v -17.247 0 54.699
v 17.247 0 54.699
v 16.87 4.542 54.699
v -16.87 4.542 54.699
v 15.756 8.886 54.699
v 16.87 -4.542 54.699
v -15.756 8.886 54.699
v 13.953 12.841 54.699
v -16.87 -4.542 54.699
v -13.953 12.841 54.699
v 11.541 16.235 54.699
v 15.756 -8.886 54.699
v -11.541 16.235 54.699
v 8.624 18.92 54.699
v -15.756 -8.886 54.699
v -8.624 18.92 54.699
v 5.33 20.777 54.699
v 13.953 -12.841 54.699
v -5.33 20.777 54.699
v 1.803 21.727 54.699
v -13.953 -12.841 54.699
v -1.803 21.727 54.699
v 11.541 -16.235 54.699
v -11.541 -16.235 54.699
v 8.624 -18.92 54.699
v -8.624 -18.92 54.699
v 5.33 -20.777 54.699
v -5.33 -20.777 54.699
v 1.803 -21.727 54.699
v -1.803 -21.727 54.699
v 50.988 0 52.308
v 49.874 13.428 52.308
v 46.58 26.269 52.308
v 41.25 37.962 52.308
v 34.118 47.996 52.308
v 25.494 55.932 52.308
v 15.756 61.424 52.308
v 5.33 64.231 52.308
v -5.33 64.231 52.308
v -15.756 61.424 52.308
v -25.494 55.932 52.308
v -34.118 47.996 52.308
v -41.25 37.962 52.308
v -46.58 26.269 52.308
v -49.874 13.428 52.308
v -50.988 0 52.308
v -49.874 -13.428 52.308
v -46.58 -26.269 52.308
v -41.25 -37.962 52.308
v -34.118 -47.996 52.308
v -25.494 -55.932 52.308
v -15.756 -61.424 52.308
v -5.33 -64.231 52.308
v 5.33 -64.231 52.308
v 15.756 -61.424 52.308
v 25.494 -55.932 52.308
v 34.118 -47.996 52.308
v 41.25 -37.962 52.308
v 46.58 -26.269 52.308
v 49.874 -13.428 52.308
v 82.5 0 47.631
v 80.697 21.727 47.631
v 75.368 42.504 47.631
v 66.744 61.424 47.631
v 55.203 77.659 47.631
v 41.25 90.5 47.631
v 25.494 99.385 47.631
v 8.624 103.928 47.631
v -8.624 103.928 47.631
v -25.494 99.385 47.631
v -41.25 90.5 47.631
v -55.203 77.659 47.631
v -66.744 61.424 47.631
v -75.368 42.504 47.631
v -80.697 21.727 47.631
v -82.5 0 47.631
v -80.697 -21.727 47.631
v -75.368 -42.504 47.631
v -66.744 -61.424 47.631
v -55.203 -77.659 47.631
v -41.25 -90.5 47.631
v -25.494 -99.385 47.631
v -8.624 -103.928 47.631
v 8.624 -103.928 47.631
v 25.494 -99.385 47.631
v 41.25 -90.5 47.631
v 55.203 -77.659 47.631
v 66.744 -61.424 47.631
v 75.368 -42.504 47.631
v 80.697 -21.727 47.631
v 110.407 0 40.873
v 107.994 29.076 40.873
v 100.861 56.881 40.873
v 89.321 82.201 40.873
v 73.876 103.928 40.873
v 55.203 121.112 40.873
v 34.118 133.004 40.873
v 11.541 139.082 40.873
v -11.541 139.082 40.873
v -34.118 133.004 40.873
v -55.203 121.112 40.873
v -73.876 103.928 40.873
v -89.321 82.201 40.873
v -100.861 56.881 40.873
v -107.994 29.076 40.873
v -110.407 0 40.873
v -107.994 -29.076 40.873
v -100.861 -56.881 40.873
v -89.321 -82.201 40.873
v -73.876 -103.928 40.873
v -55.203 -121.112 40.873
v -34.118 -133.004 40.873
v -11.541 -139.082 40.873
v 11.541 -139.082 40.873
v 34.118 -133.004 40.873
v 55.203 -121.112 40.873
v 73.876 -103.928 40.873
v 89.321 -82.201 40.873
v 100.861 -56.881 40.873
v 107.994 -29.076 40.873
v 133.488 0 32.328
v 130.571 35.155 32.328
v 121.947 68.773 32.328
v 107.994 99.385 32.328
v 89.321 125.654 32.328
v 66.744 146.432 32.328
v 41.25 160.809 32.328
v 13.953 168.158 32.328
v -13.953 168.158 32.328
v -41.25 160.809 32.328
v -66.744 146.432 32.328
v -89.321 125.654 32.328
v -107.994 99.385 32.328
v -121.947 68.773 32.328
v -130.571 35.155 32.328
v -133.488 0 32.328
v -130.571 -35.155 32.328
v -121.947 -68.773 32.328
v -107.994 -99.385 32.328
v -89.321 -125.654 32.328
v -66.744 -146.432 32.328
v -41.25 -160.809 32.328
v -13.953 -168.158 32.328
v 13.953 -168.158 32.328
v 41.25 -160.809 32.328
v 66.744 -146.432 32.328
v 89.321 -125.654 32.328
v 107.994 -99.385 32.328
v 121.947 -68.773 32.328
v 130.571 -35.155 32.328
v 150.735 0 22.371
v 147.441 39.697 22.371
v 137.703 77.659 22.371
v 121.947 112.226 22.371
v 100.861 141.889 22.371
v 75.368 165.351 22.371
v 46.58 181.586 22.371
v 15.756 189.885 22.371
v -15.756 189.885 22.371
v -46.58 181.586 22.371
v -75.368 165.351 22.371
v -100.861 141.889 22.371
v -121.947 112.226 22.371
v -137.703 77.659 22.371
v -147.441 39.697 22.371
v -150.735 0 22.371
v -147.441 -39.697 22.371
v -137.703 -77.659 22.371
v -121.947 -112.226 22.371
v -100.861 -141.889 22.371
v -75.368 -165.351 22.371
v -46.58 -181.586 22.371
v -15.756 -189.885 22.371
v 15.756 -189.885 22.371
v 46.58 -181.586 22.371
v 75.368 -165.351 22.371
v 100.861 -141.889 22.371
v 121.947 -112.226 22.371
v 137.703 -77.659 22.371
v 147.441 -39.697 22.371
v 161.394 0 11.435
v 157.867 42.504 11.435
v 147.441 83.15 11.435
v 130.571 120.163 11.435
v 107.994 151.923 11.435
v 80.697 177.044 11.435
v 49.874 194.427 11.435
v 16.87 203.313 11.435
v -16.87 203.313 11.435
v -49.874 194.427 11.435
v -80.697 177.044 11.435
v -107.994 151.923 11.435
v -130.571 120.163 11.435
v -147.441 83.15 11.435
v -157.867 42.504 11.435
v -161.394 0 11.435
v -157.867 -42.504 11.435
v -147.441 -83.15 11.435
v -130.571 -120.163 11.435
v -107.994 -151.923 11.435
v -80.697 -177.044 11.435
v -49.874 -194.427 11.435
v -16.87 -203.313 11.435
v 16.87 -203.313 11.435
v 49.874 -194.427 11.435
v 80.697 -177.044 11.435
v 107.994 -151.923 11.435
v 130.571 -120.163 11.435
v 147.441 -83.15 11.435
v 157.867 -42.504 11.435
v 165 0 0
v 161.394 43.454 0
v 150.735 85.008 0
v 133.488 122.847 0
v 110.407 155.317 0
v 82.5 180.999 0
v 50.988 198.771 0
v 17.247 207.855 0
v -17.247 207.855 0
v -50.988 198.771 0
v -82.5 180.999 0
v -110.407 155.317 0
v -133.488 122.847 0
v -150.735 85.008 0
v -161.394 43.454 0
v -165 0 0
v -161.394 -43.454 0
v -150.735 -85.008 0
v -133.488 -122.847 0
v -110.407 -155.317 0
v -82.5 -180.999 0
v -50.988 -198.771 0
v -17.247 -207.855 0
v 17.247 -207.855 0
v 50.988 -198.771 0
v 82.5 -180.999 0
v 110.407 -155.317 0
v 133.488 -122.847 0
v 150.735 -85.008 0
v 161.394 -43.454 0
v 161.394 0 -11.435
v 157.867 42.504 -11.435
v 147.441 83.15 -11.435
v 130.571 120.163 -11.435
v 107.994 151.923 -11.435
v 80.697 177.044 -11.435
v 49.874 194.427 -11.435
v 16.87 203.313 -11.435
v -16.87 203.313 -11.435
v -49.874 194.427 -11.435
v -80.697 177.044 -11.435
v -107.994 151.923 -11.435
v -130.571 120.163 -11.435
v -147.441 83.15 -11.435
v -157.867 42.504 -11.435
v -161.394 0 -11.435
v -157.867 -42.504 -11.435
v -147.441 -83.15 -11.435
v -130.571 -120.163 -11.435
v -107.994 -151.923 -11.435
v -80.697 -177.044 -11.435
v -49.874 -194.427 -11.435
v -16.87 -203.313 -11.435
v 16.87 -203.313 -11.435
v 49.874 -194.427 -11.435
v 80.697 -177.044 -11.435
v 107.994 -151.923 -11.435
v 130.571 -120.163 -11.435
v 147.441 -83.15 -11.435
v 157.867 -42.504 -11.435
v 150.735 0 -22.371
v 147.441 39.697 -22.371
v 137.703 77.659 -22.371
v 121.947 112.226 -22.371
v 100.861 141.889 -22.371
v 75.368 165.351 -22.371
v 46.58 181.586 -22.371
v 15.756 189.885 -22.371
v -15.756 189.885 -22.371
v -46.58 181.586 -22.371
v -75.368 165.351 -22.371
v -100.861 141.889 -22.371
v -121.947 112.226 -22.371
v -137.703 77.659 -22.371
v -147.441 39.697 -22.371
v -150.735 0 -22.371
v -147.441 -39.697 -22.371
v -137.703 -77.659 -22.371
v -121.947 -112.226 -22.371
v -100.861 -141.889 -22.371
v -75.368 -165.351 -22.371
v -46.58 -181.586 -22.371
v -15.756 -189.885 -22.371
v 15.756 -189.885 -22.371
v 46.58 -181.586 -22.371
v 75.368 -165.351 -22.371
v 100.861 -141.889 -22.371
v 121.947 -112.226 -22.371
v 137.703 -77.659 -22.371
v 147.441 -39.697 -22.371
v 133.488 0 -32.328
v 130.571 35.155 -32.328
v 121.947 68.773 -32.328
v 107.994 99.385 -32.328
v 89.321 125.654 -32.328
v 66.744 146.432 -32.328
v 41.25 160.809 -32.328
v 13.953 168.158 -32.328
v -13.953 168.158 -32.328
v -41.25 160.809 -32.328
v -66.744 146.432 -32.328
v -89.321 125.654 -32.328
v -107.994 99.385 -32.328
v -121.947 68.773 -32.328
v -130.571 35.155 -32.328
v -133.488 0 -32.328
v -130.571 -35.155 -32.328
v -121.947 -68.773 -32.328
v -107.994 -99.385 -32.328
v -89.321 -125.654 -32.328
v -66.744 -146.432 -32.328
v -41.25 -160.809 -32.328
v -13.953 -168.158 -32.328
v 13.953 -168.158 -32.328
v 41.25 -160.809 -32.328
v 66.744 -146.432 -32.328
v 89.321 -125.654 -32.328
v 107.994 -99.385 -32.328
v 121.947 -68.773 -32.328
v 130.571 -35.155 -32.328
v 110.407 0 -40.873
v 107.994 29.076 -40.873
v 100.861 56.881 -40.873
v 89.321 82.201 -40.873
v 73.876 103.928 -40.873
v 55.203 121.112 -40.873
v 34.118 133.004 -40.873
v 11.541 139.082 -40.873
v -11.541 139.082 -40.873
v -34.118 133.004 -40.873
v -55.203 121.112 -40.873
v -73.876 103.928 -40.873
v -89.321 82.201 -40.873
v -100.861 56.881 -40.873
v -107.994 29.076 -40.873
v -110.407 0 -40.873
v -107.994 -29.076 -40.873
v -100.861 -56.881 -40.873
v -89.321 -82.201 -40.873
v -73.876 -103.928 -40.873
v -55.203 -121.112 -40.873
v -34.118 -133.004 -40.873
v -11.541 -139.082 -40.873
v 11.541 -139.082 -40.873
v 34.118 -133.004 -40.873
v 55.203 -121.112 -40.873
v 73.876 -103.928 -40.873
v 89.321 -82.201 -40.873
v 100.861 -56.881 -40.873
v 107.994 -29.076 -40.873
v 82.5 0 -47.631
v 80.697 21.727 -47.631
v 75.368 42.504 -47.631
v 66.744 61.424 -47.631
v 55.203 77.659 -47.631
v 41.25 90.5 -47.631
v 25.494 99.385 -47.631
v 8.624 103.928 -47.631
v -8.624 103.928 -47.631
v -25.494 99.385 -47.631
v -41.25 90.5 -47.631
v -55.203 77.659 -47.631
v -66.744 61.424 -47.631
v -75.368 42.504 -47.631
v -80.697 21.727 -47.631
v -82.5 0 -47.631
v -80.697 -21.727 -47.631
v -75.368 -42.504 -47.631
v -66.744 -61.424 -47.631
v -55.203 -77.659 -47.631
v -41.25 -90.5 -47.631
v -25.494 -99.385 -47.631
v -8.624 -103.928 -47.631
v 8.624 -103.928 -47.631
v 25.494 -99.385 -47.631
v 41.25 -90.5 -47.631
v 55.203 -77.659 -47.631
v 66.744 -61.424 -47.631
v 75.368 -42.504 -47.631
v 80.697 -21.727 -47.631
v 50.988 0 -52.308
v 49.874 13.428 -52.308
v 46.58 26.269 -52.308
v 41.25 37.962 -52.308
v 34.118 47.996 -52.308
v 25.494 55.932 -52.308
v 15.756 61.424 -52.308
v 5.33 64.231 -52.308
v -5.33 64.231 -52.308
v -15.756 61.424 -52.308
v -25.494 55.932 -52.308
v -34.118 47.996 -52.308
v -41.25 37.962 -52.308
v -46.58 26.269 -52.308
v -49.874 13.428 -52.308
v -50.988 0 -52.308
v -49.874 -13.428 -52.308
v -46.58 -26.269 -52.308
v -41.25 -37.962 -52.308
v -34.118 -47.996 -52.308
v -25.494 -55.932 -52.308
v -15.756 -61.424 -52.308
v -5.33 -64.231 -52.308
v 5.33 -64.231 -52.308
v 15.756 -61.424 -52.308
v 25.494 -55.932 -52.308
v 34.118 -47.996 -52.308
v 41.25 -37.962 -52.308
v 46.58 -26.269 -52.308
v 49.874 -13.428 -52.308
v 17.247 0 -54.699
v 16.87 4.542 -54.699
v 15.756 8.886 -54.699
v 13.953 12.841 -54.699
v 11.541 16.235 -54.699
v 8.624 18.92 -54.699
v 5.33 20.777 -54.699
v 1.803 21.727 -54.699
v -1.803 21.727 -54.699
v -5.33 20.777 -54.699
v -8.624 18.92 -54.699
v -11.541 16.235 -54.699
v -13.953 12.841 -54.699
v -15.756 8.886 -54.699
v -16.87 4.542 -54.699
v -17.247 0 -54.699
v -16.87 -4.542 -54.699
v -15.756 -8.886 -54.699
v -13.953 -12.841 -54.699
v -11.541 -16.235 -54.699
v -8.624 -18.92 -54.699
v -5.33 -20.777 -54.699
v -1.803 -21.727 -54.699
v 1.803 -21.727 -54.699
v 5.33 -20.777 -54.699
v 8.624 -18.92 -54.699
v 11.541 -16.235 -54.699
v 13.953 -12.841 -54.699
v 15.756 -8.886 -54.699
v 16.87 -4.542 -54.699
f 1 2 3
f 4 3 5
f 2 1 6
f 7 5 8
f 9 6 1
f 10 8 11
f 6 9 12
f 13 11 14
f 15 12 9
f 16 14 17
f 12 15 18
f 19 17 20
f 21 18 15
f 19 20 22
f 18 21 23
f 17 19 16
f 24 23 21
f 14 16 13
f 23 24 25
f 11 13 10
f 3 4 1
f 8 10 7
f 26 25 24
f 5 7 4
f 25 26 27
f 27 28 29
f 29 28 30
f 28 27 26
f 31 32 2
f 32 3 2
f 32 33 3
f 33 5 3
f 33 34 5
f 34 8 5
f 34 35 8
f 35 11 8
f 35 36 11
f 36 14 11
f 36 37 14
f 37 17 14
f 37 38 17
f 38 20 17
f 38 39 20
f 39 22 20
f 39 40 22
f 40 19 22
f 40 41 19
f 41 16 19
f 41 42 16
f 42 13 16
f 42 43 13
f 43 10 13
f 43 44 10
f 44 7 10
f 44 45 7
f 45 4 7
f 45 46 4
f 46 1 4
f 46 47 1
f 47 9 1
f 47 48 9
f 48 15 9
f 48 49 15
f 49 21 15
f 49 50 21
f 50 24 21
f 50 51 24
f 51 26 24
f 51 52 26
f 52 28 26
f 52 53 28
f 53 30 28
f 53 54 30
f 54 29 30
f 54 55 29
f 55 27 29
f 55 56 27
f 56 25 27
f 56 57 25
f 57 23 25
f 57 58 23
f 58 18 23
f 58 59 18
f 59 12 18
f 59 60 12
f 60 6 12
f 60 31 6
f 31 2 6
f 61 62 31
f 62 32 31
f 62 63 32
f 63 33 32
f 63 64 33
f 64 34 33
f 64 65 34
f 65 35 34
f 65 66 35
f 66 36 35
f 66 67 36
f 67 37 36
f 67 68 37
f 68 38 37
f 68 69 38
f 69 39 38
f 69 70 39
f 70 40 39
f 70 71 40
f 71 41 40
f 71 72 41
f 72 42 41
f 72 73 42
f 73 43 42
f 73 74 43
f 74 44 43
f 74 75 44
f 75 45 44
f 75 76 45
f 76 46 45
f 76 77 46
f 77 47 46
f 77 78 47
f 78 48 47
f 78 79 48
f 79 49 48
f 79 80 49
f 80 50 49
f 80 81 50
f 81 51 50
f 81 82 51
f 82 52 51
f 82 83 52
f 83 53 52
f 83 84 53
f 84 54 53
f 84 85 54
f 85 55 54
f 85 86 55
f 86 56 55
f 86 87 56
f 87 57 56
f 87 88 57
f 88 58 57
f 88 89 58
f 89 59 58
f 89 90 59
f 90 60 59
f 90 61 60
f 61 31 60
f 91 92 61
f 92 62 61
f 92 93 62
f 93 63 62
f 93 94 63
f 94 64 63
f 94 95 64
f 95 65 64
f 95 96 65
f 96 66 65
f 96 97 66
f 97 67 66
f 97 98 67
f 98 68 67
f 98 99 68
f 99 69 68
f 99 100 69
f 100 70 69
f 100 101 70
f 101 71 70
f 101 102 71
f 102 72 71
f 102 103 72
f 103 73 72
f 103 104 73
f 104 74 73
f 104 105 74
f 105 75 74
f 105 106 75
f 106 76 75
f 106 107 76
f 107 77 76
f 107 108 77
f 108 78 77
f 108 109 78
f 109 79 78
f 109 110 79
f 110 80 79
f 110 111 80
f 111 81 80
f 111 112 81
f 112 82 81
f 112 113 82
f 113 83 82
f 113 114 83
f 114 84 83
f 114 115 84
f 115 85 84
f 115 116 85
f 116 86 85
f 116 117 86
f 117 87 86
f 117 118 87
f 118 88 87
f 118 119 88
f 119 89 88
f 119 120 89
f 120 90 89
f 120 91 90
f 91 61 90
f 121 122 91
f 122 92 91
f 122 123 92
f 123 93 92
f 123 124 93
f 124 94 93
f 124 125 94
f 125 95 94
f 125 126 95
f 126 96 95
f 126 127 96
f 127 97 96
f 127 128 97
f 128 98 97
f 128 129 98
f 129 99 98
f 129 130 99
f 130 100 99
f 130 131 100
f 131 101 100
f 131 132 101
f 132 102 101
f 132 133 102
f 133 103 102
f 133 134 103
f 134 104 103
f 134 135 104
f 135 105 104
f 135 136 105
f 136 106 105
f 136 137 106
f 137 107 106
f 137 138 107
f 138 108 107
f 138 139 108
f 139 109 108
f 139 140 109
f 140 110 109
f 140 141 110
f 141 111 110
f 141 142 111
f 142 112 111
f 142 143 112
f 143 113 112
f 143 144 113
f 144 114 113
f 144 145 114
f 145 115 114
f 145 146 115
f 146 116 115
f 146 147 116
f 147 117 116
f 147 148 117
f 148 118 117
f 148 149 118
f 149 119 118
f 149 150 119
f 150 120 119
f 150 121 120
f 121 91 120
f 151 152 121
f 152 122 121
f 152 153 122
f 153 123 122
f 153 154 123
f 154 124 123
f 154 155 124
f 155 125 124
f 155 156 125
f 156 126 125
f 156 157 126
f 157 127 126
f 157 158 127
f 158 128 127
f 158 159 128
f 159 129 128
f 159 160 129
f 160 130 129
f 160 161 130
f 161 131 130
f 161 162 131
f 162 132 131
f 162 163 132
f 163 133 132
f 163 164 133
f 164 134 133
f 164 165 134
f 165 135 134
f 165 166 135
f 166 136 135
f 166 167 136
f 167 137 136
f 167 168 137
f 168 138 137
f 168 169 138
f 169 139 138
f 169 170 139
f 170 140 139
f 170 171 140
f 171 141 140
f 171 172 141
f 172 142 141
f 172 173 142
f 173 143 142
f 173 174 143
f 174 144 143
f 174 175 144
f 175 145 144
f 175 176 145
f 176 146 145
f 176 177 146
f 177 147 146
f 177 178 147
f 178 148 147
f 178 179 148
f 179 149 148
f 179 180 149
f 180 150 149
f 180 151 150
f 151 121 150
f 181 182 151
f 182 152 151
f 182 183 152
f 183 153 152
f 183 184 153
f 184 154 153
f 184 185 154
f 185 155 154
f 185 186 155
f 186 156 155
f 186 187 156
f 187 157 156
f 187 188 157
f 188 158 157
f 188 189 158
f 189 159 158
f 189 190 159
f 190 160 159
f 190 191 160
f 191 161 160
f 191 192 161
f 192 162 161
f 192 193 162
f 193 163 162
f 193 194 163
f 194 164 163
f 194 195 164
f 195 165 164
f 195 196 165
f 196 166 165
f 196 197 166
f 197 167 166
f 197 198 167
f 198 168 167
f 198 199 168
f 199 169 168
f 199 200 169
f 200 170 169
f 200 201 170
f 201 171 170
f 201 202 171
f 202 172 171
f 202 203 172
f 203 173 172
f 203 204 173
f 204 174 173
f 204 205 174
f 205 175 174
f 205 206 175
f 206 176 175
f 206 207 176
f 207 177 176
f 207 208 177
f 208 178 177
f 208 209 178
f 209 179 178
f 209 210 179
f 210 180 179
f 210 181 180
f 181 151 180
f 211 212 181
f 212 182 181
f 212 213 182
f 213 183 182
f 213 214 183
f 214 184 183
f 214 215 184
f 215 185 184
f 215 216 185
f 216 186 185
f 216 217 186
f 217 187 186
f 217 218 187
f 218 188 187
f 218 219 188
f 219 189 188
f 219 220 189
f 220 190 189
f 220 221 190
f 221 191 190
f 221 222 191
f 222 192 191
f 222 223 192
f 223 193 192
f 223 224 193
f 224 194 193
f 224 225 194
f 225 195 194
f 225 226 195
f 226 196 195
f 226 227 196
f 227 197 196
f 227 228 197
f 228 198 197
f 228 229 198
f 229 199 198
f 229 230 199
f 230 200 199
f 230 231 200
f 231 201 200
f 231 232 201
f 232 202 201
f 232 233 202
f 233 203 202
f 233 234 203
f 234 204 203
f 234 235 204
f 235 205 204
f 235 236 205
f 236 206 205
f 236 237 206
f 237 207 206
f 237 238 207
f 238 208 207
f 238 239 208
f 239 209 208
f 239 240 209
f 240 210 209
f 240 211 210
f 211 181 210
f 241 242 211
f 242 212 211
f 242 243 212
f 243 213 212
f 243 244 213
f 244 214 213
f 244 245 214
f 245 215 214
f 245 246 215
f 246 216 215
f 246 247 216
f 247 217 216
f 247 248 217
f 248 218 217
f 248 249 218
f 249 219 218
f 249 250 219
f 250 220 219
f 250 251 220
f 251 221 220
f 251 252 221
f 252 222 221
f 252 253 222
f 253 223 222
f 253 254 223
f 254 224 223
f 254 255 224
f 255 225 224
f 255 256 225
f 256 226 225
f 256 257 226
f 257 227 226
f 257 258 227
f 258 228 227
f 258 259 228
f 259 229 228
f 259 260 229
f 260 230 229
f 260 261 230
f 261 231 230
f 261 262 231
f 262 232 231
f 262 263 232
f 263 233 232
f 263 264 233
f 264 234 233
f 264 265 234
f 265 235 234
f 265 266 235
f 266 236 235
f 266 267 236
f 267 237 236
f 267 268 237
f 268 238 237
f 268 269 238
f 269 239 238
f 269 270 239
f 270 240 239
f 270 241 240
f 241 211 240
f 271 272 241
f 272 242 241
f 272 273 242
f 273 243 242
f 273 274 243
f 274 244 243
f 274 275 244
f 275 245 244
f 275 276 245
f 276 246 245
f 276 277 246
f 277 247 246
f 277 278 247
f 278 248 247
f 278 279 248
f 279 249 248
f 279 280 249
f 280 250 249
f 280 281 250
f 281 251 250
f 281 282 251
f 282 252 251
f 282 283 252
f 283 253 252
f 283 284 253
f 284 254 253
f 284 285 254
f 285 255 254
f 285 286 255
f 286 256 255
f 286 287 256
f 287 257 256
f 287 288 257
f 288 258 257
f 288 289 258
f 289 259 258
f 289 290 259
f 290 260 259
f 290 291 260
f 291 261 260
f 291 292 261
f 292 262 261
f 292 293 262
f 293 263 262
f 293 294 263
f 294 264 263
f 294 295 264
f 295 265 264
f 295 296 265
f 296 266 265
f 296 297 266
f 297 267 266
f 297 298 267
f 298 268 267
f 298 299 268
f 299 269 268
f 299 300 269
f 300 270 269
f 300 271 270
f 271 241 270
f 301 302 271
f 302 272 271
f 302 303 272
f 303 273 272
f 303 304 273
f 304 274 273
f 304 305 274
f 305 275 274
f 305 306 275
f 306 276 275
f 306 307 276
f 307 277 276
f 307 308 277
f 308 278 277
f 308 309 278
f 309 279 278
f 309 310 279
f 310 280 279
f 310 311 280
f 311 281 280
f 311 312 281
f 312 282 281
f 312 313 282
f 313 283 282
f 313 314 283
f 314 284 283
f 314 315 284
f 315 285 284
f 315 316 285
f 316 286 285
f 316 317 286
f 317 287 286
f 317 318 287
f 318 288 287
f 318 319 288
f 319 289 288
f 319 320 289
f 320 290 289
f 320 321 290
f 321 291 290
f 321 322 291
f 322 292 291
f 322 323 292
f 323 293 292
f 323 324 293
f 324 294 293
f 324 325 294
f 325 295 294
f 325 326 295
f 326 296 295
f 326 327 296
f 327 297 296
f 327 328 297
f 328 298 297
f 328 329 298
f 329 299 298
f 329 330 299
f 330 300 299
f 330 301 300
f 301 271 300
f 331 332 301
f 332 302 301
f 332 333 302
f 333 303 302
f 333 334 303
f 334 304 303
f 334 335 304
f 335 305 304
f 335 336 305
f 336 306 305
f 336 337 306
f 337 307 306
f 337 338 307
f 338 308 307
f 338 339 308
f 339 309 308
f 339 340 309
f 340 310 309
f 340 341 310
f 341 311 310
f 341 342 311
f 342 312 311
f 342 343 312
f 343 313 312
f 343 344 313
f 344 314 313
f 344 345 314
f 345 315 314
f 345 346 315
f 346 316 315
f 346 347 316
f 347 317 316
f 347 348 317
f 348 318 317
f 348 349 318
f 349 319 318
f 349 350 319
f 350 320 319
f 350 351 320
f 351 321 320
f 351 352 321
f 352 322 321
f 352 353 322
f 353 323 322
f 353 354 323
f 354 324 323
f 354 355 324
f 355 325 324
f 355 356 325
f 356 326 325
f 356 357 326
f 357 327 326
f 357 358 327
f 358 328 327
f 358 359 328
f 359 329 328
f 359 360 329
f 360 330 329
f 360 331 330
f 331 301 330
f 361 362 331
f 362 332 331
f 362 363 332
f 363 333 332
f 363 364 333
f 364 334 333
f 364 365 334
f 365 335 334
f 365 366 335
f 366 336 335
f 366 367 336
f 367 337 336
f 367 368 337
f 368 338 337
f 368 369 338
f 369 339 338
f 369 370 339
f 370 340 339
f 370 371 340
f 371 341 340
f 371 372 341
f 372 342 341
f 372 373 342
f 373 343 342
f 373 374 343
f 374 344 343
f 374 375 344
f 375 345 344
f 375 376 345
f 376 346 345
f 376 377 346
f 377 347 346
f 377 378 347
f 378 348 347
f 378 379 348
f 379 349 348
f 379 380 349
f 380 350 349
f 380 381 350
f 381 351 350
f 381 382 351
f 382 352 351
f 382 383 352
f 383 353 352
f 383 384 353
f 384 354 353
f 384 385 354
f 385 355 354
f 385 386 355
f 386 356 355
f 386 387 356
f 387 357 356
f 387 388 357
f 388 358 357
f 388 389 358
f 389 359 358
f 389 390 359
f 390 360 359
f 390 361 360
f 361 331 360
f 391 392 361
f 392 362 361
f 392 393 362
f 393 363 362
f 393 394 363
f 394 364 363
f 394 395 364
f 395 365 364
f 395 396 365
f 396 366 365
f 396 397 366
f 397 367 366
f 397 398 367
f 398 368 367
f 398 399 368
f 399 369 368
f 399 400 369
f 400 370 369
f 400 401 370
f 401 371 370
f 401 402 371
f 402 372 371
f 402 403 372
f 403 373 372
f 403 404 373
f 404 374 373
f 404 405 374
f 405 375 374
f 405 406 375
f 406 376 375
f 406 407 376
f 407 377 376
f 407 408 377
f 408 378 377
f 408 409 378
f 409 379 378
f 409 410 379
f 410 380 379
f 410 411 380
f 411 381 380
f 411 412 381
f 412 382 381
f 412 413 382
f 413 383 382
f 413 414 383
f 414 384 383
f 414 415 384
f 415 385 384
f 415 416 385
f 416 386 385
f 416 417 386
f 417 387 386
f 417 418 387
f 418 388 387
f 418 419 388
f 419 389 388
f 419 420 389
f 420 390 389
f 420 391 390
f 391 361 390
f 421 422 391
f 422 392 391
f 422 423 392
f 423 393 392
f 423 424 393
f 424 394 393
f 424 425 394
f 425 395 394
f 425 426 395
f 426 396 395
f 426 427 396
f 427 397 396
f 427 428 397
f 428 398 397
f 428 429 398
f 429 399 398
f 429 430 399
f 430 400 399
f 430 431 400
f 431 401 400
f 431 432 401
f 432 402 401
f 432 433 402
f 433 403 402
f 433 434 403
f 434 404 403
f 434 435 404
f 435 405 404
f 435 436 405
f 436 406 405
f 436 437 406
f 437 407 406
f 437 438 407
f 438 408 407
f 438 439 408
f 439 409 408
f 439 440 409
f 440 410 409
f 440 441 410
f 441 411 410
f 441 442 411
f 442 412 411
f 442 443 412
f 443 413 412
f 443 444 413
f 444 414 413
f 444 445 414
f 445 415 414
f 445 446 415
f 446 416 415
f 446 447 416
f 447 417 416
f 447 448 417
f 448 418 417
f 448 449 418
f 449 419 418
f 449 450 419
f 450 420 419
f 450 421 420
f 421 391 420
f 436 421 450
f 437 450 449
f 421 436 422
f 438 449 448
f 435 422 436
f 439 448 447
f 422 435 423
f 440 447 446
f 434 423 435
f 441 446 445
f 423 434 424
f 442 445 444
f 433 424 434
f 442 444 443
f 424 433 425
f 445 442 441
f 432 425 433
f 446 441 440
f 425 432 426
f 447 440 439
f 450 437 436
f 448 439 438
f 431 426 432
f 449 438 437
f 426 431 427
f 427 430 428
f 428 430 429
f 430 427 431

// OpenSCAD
// Generated by SolidPython 1.0.1 on 2020-07-29 00:46:52


scale(v = [15, 19, 5]) {
	sphere(r = 11);
}
/***********************************************
*********      SolidPython code:      **********
************************************************
 
# import packages: SolidPython
from solid import *
from solid.utils import *
from itertools import chain, combinations, permutations


class Resize:

    def __init__(self, scad_file):
        self.scad_file = scad_file
        #self.scad_file = import_scad(scad_file)
        # cone/cylinder param:
        self.r1 = 0
        self.r2 = 0
        self.h = 0
        # rectangular prism param:
        self.w = 0
        self.l = 0
        # ellipse param:
        self.r = 0

    # import OpenScad code (file name corresponds to shape)


    # classify shape + parameters
    def assign(self, param1, param2, param3):
        if self.scad_file == 'cone.scad':
            self.r1 = param1
            self.r2 = param2
            self.h = param3
        elif self.scad_file == 'cylinder.scad':
            self.r1 = param1
            self.r2 = param2
            self.h = param3
        elif self.scad_file == 'rectangularPrism.scad':
            self.h = param1
            self.l = param2
            self.w = param3
        else:
            self.r = param1
            self.h = param2

    # resize parameters
    def iterate(self):
        x = range(3, 20, 2)
        i = 1
        if self.scad_file == 'cone.scad':
            tempList = list(permutations(x, 2))
            for temp in tempList:
                param1 = temp[0]
                param2 = temp[1]
                filepath = 'produced_scad_files/' + 'cone' + str(param1) + '_' + str(param2) + '_' + '.scad'
                scad_render_to_file(cylinder(h=param1, r1=param2, r2=0), filepath)

        elif self.scad_file == 'cylinder.scad':
            tempList = list(permutations(x, 3))
            for temp in tempList:
                param1 = temp[0]
                param2 = temp[1]
                filepath = 'produced_scad_files/' + 'cylinder' + str(param1) + '_' + str(param2) + '_' + '.scad'
                scad_render_to_file(cylinder(h=param1, r1=param2, r2=param2), filepath)

        elif self.scad_file == 'rectangularPrism.scad':
            tempList = list(permutations(x, 3))
            for temp in tempList:
                param1 = temp[0]
                param2 = temp[1]
                param3 = temp[2]
                filepath = 'produced_scad_files/' + 'rectangularPrism' + str(param1) + '_' + str(param2) + '_' + str(
                    param3) + '.scad'
                scad_render_to_file(cube(size=(param1, param2, param3)), filepath)

        elif self.scad_file == 'ellipse.scad':
            tempList = list(permutations(x, 4))
            for temp in tempList:
                param1 = temp[0]
                param2 = temp[1]
                param3 = temp[2]
                param4 = temp[3]
                filepath = 'produced_scad_files/' + 'ellipse' + str(param1) + '_' + str(param2) + '_' + str(param3) + '_' + str(param4) + '.scad'
                scad_render_to_file(scale([param1, param2, param3])(sphere(r=param4)), filepath)

    def render_to_scadfile(self):
        scad_render_to_file(scad, 'example.scad') 
 
************************************************/
